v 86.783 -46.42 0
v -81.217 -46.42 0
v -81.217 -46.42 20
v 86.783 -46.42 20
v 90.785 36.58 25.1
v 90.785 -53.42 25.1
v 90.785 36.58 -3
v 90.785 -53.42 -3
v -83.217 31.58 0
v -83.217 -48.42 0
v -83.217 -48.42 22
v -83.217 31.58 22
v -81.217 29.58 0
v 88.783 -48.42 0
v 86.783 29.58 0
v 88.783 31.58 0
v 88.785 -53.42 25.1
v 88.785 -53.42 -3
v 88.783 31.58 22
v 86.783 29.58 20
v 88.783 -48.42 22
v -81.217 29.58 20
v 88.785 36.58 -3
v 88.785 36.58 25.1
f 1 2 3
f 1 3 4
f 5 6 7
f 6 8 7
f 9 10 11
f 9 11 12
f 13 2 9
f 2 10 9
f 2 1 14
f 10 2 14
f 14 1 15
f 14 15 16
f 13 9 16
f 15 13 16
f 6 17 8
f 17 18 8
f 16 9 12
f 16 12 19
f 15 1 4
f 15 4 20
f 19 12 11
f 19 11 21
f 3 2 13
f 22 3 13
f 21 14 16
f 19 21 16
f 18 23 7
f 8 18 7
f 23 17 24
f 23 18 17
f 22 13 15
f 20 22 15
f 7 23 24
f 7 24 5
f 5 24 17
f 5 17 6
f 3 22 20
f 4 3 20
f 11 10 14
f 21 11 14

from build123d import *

# Parameters (mm, degrees)
F0_W     = 172
F0_H     = 80
F1_DEPTH = 22
F2_T     = -2
F3_W     = 2
F3_H     = 90
F4_DEPTH = 22.1
F5_DEPTH = 3
F6_DEPTH = 3


with BuildPart() as f1:
    # F0 (on Top) → F1 (new body)
    with BuildSketch(Plane.XY):
        with Locations((2.7826657335, -8.4195947275)):
            Rectangle(F0_W, F0_H)
    extrude(amount=F1_DEPTH)

    # F2
    f2_openings = [f1.faces().sort_by_distance(p)[0] for p in [
        (2.782666, -8.419595, 0),
    ]]
    offset(amount=F2_T, openings=f2_openings)


with BuildPart() as f4:
    # F3 (on Top) → F4 (new body)
    with BuildSketch(Plane.XY):
        with Locations((89.7852818131, -8.4195947275)):
            Rectangle(F3_W, F3_H)
    extrude(amount=F4_DEPTH)

    # F5 (add): a face of the model
    f5_faces = [f4.faces().sort_by_distance(p)[0] for p in [
        (89.7852818131, -8.4195947275, 0),
    ]]
    extrude(f5_faces, amount=F5_DEPTH)

    # F6 (add): a face of the model
    f6_faces = [f4.faces().sort_by_distance(p)[0] for p in [
        (89.7852818131, -8.4195947275, 22.1),
    ]]
    extrude(f6_faces, amount=F6_DEPTH)


solid = Compound([f1.part, f4.part])
